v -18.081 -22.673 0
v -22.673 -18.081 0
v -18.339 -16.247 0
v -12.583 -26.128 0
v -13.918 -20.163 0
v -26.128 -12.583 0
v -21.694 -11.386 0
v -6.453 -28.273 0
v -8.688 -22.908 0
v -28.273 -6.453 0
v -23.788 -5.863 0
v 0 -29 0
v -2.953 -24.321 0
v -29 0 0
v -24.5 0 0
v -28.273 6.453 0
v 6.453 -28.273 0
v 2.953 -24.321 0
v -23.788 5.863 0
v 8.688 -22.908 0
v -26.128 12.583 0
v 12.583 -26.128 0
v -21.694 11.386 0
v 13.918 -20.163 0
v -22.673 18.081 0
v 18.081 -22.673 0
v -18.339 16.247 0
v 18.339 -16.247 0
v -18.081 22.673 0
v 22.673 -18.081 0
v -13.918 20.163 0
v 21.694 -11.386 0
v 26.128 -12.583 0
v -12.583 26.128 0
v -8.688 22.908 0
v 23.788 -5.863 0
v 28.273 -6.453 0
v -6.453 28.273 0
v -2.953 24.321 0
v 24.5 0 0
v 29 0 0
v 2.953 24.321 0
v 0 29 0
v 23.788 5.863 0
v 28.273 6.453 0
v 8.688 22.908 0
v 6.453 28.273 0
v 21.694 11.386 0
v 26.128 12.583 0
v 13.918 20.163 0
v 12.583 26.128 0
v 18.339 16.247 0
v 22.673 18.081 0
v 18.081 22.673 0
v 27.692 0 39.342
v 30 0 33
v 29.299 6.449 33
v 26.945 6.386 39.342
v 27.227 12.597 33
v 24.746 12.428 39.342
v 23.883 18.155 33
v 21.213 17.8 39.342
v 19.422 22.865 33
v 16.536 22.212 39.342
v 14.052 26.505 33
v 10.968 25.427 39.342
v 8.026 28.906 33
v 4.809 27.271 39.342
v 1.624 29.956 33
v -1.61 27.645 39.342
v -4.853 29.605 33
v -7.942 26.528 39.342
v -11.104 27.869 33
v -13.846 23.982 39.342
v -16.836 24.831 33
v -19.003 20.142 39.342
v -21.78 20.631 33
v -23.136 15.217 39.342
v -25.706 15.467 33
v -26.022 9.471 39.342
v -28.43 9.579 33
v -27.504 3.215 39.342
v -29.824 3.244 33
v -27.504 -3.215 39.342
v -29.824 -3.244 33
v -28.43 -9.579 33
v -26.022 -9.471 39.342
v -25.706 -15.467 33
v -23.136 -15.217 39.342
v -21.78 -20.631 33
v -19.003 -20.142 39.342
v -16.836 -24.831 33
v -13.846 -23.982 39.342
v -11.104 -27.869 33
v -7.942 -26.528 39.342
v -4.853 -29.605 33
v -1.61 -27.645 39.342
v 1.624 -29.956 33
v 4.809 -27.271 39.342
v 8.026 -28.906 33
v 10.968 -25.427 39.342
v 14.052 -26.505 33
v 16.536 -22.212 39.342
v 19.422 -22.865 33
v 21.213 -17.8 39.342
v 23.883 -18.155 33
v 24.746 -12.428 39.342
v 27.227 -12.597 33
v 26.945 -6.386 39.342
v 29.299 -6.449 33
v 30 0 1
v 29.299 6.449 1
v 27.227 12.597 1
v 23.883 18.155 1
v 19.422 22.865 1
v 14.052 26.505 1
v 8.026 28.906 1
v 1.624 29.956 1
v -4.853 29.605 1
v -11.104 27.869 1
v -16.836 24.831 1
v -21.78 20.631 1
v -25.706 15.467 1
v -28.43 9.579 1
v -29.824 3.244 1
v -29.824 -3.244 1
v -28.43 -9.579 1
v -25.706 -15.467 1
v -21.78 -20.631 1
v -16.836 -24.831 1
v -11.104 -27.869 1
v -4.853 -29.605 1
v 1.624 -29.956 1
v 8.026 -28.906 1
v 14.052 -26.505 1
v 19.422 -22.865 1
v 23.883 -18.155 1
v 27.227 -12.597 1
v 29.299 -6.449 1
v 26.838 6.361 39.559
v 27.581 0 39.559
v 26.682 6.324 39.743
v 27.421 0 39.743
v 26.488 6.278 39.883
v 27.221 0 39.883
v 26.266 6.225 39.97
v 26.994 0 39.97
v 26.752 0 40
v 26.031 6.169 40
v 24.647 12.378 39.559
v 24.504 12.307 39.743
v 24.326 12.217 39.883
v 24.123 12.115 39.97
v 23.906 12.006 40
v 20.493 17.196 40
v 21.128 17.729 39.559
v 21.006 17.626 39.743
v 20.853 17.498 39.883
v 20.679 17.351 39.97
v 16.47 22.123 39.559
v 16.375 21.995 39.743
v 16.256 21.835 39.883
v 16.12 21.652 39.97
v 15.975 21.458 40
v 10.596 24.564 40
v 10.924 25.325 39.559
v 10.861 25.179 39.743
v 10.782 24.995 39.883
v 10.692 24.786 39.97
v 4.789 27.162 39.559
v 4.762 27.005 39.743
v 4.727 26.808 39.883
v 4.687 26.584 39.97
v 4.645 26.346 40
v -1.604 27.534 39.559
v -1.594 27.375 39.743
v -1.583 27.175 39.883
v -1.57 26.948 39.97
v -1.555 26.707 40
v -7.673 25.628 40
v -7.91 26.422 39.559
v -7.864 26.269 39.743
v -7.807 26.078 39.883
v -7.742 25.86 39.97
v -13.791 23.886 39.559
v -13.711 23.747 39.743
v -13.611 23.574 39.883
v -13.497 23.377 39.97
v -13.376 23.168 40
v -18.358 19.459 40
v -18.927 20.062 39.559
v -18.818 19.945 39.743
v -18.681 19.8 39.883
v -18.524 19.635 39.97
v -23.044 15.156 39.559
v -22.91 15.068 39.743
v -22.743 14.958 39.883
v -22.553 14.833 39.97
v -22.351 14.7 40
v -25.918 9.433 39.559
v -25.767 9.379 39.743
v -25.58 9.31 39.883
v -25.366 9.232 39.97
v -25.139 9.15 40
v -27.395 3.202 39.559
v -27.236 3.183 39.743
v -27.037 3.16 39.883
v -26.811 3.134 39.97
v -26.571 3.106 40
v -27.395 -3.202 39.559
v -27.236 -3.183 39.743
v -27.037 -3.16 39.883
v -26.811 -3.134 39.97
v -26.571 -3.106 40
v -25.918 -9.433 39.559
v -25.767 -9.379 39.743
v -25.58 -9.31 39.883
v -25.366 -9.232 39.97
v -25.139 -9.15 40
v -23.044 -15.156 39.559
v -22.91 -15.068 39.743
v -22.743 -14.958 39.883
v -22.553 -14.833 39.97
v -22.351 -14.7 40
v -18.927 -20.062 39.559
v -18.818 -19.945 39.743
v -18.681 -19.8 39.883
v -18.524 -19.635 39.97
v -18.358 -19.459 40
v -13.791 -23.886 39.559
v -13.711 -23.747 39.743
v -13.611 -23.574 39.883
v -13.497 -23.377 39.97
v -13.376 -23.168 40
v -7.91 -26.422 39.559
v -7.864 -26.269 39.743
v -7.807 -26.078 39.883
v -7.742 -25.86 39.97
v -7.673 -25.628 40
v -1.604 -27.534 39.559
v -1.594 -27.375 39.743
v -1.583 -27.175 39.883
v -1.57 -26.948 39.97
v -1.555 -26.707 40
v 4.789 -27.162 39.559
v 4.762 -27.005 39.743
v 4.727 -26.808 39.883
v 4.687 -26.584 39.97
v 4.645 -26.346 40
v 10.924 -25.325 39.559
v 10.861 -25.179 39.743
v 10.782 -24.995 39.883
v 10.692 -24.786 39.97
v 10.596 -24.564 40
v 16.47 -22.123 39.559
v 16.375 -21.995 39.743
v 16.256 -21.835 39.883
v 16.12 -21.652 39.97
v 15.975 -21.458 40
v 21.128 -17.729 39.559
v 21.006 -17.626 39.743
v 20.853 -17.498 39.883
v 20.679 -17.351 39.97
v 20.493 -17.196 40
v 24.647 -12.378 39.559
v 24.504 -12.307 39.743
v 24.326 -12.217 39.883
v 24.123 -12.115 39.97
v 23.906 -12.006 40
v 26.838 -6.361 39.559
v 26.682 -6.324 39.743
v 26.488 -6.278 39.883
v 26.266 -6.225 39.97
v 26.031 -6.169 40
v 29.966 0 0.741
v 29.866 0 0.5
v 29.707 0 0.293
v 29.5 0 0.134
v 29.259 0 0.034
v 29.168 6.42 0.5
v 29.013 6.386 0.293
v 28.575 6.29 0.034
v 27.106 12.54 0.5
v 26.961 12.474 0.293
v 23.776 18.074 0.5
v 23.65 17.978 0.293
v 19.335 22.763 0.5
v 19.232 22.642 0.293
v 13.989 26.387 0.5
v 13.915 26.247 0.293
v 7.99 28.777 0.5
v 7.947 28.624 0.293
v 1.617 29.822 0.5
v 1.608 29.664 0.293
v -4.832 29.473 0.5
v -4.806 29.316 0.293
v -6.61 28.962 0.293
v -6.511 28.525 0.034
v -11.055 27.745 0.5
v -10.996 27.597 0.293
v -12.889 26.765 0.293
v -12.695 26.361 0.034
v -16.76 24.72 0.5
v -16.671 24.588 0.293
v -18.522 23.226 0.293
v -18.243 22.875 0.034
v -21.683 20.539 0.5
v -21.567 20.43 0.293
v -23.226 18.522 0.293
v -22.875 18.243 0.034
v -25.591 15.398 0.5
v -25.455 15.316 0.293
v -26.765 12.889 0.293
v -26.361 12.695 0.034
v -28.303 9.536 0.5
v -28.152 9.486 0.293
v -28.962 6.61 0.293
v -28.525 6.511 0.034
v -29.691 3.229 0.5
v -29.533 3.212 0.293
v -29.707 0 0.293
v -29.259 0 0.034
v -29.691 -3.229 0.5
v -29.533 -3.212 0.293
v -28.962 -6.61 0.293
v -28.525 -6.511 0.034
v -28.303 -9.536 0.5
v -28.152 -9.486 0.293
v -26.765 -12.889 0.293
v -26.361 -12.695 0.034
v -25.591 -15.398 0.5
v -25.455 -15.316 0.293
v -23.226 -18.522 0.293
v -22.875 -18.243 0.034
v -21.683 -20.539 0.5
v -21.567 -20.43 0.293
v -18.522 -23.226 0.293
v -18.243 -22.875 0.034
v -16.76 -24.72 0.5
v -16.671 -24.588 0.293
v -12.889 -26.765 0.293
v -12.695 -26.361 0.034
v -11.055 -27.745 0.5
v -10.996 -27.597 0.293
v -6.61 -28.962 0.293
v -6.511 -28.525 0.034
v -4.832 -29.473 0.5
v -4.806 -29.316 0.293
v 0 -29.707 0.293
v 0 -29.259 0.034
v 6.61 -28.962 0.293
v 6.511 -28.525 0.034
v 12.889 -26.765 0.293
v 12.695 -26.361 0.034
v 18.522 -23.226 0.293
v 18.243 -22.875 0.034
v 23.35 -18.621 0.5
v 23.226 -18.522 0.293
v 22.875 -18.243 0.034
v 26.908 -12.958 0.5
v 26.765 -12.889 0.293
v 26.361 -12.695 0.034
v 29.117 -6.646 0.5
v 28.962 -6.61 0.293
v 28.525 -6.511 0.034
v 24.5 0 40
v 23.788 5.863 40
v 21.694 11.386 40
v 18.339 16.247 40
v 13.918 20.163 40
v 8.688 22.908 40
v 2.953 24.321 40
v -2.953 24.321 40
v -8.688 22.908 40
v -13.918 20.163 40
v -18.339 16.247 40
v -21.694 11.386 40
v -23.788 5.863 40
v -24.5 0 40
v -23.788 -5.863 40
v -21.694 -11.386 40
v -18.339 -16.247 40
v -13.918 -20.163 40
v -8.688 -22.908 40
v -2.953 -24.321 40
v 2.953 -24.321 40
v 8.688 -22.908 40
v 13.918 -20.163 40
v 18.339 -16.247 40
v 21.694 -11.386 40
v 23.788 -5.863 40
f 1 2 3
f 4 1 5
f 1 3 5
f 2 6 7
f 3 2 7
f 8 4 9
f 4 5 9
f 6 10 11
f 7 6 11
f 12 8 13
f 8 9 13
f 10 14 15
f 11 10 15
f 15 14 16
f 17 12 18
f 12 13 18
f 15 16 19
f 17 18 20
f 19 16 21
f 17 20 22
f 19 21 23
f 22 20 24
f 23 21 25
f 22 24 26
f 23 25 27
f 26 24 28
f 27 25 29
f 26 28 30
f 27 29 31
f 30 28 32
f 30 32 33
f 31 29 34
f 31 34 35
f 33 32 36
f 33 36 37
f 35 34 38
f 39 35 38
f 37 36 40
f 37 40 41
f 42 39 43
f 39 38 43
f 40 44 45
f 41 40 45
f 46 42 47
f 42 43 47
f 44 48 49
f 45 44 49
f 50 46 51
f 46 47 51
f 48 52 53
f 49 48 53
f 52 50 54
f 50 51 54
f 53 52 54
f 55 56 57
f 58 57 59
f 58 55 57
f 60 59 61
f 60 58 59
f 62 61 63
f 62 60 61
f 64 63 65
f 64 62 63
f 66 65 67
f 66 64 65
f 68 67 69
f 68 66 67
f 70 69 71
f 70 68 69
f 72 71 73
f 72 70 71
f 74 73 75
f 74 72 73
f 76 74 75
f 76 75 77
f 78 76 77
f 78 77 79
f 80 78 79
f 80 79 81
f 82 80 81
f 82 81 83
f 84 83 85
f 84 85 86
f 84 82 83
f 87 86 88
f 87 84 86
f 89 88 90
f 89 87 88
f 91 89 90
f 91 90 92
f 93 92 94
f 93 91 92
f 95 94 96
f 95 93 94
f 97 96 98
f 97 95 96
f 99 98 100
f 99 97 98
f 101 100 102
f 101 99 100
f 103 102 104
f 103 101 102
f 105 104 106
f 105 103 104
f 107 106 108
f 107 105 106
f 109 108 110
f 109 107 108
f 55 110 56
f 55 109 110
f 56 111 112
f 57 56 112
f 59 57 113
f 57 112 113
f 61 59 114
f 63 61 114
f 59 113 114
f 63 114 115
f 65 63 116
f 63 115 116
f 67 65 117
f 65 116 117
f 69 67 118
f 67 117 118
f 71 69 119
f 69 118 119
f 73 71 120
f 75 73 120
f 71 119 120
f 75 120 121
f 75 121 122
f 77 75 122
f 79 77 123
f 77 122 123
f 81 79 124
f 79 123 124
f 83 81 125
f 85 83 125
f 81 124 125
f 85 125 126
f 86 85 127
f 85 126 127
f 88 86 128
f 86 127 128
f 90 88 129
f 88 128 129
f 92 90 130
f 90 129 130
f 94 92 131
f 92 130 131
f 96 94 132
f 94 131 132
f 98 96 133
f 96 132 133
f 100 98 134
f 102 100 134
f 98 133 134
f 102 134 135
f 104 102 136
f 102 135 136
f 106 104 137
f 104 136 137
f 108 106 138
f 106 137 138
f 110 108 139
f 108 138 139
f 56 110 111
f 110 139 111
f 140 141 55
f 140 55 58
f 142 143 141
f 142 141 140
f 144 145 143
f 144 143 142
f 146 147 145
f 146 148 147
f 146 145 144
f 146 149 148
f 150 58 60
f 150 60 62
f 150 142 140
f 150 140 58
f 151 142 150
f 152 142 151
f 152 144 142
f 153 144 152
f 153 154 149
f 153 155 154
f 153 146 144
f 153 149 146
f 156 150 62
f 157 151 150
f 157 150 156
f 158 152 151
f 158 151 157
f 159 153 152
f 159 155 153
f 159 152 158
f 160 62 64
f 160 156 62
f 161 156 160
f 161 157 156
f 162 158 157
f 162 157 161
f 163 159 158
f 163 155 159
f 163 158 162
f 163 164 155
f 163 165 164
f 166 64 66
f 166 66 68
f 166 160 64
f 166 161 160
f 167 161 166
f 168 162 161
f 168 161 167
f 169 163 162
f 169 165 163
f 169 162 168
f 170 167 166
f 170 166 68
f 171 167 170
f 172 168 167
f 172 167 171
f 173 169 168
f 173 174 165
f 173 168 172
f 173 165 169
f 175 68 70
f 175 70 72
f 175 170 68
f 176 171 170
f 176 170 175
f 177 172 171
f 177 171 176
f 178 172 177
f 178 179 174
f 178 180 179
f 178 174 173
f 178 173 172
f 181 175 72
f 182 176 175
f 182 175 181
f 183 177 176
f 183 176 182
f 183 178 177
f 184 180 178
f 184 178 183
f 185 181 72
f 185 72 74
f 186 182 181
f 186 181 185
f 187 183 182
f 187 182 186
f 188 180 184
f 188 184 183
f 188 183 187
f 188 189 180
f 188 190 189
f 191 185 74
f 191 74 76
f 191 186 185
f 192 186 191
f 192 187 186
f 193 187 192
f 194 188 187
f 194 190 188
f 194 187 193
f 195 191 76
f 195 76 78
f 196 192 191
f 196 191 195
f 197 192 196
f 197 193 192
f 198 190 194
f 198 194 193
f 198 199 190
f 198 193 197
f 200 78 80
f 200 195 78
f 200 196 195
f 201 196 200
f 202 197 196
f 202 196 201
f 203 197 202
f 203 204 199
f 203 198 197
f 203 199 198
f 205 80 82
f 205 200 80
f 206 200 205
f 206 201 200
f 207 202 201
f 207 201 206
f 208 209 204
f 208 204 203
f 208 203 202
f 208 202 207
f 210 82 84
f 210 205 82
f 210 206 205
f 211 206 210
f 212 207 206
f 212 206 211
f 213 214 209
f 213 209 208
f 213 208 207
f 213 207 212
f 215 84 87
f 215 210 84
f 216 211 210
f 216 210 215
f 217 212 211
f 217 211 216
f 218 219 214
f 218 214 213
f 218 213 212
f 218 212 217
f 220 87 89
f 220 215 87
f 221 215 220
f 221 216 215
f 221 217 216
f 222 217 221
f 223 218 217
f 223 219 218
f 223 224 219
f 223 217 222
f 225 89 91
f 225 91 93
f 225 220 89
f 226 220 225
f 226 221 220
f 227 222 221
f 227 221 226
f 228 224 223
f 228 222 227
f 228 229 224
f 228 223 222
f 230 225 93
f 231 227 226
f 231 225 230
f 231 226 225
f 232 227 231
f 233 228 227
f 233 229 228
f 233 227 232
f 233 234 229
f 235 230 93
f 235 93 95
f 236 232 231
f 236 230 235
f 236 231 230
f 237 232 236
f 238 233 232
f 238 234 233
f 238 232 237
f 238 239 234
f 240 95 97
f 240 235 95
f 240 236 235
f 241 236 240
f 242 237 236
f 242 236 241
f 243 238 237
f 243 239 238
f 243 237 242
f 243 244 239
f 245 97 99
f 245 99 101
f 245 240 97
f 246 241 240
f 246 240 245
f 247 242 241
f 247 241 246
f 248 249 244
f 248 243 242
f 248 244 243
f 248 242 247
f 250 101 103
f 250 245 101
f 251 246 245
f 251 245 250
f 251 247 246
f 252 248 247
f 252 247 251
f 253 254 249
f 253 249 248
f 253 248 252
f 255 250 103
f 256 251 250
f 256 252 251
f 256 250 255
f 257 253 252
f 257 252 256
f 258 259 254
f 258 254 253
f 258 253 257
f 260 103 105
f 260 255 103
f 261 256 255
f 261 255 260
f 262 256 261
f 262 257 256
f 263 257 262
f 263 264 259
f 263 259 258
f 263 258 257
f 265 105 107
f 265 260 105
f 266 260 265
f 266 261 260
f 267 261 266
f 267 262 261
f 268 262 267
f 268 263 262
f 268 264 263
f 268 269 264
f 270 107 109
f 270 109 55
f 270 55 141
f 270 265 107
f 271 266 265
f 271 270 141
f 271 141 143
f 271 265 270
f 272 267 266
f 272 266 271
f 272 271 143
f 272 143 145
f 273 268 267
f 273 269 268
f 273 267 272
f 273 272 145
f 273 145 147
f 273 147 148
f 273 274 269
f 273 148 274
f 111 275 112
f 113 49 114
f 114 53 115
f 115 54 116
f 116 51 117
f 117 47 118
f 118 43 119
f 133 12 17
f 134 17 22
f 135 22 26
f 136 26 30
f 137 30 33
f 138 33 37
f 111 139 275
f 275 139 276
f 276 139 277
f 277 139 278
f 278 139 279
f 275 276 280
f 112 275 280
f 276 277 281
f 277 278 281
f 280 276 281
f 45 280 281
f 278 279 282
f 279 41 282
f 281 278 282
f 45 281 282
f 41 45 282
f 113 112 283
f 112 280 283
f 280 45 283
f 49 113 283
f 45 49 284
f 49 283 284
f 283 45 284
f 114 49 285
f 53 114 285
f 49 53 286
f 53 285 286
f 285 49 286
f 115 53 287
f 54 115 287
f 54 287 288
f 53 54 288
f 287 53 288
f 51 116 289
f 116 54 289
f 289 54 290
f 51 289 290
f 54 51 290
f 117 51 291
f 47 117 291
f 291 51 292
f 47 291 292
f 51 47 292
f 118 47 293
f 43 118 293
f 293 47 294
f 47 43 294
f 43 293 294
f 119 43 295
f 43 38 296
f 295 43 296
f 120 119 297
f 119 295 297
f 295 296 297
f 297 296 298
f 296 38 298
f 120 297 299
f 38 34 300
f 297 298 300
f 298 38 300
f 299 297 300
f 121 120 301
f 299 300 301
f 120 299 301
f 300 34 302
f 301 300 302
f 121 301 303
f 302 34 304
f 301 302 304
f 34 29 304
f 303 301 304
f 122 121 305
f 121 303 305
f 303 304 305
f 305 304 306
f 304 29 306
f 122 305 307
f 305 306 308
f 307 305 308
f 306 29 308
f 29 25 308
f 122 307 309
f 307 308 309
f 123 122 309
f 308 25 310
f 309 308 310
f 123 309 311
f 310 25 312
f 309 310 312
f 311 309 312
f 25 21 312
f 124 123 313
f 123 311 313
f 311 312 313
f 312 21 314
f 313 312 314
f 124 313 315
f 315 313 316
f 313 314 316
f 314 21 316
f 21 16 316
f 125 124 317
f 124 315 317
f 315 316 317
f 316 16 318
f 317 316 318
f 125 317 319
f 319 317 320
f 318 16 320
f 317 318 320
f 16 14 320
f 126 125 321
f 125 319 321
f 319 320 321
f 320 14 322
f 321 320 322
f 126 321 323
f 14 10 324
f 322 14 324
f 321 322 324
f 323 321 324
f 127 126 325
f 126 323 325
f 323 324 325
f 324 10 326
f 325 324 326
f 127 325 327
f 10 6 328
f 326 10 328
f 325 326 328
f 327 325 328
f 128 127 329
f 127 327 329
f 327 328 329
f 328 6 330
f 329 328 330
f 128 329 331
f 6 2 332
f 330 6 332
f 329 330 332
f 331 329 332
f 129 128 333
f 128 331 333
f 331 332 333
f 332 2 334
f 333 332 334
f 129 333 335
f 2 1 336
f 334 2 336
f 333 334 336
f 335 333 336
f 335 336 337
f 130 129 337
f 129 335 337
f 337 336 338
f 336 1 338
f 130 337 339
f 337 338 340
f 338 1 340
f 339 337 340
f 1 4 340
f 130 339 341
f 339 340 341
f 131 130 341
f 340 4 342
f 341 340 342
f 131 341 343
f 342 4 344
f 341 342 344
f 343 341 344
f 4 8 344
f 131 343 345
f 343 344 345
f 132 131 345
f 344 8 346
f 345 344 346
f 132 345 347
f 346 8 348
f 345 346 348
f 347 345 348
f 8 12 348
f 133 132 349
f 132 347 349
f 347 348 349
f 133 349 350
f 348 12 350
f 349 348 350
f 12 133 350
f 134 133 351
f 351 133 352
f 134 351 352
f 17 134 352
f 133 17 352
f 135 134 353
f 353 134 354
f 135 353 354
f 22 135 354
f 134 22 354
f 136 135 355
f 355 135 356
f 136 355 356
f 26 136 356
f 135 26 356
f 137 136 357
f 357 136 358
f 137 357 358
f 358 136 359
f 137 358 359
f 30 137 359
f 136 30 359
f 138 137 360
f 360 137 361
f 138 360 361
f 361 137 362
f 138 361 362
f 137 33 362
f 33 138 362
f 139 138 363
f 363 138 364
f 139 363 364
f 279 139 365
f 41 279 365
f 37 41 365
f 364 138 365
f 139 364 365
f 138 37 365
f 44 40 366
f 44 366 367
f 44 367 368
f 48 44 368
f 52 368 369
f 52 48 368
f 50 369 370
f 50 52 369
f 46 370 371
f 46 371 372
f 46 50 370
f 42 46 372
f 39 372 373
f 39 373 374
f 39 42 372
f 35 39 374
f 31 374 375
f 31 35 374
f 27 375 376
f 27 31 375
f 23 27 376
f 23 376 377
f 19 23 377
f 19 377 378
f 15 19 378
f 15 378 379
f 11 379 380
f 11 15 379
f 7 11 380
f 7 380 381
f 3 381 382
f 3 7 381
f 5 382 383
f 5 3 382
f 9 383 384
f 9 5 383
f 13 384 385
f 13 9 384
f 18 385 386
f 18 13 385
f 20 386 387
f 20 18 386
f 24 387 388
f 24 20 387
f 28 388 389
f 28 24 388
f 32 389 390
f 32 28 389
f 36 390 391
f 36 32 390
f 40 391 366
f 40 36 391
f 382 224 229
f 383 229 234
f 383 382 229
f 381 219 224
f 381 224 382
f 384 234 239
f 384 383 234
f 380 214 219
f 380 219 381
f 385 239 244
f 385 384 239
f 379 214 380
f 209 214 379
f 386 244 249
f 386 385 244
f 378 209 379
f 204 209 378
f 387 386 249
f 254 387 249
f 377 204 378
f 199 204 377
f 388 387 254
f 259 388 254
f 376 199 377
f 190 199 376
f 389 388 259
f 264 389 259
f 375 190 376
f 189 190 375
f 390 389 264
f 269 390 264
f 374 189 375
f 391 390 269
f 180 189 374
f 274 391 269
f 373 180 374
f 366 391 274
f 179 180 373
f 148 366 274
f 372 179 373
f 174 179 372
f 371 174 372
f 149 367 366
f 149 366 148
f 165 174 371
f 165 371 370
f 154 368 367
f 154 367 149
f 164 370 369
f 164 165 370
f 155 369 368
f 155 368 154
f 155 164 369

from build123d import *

# Parameters (mm, degrees)
SKETCH1_R           = 30
SKETCH1_R_2         = 24.5
BOSS_EXTRUDE1_DEPTH = 40
CHAMFER1_SIZE       = 7
CHAMFER1_SIZE2      = 2.54779164
FILLET1_R           = 1


with BuildPart() as part:
    # Sketch1 → Boss-Extrude1 (new body)
    with BuildSketch(Plane.XY):
        Circle(SKETCH1_R)
        Circle(SKETCH1_R_2, mode=Mode.SUBTRACT)
    extrude(amount=BOSS_EXTRUDE1_DEPTH)

    # Chamfer1
    chamfer1_edges = [part.edges().sort_by_distance(p)[0] for p in [
        (-30, 0, 40),
    ]]
    chamfer1_side = [part.faces().sort_by_distance(p)[0] for p in [
        (-30, 0, 20),
    ]]
    chamfer(chamfer1_edges, length=CHAMFER1_SIZE, length2=CHAMFER1_SIZE2, reference=chamfer1_side[0])

    # Fillet1
    fillet1_edges = [part.edges().sort_by_distance(p)[0] for p in [
        (-30, 0, 0),
        (-27.45220836, 0, 40),
    ]]
    fillet(fillet1_edges, radius=FILLET1_R)


solid = part.part
